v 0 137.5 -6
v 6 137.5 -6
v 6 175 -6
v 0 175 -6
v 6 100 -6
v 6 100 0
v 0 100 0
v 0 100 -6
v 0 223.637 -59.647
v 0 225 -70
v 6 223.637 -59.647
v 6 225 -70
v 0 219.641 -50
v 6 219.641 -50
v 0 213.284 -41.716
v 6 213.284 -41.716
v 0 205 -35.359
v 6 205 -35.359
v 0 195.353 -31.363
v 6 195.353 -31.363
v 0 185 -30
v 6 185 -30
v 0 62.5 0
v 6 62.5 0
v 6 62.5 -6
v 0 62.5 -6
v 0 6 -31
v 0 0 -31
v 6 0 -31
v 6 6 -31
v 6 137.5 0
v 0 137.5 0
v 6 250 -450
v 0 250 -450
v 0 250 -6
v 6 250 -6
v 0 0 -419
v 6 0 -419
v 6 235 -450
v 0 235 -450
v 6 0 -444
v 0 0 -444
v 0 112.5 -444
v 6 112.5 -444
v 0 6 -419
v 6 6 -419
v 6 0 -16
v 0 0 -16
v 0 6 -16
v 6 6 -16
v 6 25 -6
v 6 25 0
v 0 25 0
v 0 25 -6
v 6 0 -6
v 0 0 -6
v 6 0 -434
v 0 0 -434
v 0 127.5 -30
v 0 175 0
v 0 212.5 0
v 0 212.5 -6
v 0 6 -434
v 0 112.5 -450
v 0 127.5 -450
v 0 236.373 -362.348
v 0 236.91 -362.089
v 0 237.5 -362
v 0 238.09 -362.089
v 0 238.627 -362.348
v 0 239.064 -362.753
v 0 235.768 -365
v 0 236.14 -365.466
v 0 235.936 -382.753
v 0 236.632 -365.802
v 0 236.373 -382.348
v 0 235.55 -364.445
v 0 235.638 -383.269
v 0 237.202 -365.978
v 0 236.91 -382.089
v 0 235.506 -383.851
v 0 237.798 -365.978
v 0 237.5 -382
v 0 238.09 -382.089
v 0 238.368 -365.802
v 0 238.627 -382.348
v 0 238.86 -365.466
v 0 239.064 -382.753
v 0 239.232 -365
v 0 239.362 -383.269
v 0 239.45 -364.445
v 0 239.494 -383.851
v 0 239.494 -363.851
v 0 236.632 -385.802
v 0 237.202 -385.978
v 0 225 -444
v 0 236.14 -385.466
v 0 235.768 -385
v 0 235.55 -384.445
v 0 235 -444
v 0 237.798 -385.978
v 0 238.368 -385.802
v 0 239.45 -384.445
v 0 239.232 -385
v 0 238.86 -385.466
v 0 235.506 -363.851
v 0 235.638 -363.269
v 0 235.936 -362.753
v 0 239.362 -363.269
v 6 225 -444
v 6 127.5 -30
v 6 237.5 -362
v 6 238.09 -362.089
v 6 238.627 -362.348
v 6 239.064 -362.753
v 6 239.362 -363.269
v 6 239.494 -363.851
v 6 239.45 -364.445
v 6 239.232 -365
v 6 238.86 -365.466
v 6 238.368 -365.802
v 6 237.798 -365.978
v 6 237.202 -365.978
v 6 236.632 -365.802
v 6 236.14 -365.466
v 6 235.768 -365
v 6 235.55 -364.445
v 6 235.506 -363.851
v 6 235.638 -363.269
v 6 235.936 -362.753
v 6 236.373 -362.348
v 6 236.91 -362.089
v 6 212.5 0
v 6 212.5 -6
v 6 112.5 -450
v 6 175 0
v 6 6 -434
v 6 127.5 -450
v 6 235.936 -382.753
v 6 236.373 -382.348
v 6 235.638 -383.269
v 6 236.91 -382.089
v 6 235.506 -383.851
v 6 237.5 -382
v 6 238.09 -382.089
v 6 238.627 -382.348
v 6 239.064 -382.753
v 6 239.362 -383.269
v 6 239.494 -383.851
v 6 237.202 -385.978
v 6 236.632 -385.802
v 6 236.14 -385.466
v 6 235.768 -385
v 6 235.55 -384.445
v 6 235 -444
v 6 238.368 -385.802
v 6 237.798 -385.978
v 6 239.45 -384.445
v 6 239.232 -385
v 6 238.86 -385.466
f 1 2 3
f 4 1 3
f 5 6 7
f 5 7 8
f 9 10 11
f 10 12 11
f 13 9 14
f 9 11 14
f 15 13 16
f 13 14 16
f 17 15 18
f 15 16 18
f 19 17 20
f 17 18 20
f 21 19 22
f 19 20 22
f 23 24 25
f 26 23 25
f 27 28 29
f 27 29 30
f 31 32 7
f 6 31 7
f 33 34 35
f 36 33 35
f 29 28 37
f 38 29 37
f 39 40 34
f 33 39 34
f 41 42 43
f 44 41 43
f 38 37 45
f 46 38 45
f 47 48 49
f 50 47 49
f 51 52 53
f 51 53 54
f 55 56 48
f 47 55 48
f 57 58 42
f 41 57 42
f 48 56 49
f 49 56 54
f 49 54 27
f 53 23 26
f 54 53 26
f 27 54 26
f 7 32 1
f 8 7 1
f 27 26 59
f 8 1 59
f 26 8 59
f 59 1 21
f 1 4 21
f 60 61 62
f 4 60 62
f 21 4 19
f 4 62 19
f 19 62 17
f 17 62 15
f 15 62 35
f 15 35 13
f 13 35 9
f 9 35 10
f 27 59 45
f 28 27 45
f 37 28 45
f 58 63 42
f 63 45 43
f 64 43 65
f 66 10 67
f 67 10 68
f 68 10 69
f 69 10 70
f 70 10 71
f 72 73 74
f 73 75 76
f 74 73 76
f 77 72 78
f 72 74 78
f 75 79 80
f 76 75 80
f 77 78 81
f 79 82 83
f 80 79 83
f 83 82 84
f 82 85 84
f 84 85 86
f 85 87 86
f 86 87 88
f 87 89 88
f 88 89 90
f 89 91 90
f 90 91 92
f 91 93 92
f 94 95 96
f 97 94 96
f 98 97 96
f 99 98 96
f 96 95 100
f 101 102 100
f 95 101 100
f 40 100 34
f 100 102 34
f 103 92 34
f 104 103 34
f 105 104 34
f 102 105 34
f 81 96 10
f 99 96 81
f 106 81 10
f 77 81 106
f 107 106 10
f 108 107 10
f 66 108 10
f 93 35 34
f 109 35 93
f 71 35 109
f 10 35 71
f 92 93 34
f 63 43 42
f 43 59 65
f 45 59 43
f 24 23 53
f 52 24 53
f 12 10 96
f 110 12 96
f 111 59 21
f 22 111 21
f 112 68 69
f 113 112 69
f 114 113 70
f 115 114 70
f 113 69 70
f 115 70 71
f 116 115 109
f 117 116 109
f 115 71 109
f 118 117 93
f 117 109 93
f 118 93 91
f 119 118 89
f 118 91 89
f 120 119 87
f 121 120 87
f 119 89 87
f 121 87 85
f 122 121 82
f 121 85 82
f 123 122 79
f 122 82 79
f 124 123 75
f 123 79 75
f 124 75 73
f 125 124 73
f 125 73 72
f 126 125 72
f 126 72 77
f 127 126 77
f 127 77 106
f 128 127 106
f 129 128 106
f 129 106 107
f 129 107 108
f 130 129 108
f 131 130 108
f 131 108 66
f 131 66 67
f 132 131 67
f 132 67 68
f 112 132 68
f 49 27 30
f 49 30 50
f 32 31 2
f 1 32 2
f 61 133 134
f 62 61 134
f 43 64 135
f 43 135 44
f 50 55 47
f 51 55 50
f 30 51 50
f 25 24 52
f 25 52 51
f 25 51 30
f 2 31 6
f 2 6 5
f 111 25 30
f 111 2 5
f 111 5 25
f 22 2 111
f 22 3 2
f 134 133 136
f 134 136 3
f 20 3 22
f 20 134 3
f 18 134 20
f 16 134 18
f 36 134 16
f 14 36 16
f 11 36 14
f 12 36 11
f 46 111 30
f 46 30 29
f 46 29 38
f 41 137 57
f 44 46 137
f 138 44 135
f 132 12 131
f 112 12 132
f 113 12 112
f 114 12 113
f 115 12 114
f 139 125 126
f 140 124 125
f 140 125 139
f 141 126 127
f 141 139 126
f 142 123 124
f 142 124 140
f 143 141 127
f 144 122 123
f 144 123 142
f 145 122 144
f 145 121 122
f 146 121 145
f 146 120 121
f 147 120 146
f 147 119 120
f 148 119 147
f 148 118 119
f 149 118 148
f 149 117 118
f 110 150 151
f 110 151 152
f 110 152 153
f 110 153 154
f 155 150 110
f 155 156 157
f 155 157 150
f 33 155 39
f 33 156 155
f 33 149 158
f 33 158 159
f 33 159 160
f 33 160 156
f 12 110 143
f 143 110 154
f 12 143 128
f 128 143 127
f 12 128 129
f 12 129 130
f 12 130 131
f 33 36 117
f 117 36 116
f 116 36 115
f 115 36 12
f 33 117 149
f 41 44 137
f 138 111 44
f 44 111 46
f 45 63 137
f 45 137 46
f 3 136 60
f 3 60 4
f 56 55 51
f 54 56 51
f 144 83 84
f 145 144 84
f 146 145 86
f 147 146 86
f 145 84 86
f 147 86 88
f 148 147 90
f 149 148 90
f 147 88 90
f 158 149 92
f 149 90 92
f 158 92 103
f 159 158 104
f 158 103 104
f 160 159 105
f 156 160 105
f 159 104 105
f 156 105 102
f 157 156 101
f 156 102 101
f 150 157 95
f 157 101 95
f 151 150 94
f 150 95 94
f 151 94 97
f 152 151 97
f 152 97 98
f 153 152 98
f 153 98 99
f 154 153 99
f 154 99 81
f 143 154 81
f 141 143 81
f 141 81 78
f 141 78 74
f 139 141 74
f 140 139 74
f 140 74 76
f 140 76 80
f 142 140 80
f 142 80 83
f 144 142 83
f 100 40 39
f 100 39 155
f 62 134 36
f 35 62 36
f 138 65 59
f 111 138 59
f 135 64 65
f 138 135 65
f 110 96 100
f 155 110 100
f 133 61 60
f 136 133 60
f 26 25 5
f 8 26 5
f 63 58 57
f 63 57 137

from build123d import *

# Parameters (mm, degrees)
BOSS_EXTRUDE1_DEPTH = 6
SKETCH2_W           = 6
SKETCH2_H           = 37.5
CUT_EXTRUDE1_DEPTH  = 6
LPATTERN1_COUNT     = 4
LPATTERN1_PITCH     = 75
FILLET1_R           = 40
SKETCH3_W           = 6
SKETCH3_H           = 10
SKETCH3_H_2         = 112.5
CUT_EXTRUDE2_DEPTH  = 515.816472153
SKETCH4_W           = 15
SKETCH4_H           = 6
CUT_EXTRUDE3_DEPTH  = 515.816472153
SKETCH5_R           = 2
CUT_EXTRUDE4_DEPTH  = 515.816472153


with BuildPart() as part:
    # Sketch1 → Boss-Extrude1 (new body)
    with BuildSketch(Plane(origin=(0, 0, 0), x_dir=(0, 0, -1), z_dir=(1, 0, 0))):
        Polygon((450, 225), (450, 250), (0, 250), (0, 0), (450, 0), (450, 127.5), (30, 127.5), (30, 225), align=None)
    extrude(amount=BOSS_EXTRUDE1_DEPTH)

    # Sketch2 → Cut-Extrude1 (cut)
    with BuildSketch(Plane(origin=(6, 0, 0), x_dir=(0, 0, -1), z_dir=(1, 0, 0))):
        with Locations((3, 231.25)):
            Rectangle(SKETCH2_W, SKETCH2_H)
    cut_extrude1 = extrude(amount=-CUT_EXTRUDE1_DEPTH, mode=Mode.SUBTRACT)

    # LPattern1: Cut-Extrude1 ×4
    with Locations(*[(0, -i * LPATTERN1_PITCH, 0) for i in range(1, LPATTERN1_COUNT)]):
        add(cut_extrude1, mode=Mode.SUBTRACT)

    # Fillet1
    fillet1_edges = [part.edges().sort_by_distance(p)[0] for p in [
        (3, 225, -30),
    ]]
    fillet(fillet1_edges, radius=FILLET1_R)

    # Sketch3 → Cut-Extrude2 (cut, through all)
    with BuildSketch(Plane.ZY):
        with Locations((-447, 230)):
            Rectangle(SKETCH3_W, SKETCH3_H)
        with Locations((-447, 56.25)):
            Rectangle(SKETCH3_W, SKETCH3_H_2)
    extrude(amount=-CUT_EXTRUDE2_DEPTH, mode=Mode.SUBTRACT)

    # Sketch4 → Cut-Extrude3 (cut, through all)
    with BuildSketch(Plane.ZY):
        with Locations((-23.5, 3)):
            Rectangle(SKETCH4_W, SKETCH4_H)
        with Locations((-426.5, 3)):
            Rectangle(SKETCH4_W, SKETCH4_H)
    extrude(amount=-CUT_EXTRUDE3_DEPTH, mode=Mode.SUBTRACT)

    # Sketch5 → Cut-Extrude4 (cut, through all)
    with BuildSketch(Plane.ZY):
        with Locations((-384, 237.5)):
            Circle(SKETCH5_R)
        with Locations((-364, 237.5)):
            Circle(SKETCH5_R)
    extrude(amount=-CUT_EXTRUDE4_DEPTH, mode=Mode.SUBTRACT)


solid = part.part
